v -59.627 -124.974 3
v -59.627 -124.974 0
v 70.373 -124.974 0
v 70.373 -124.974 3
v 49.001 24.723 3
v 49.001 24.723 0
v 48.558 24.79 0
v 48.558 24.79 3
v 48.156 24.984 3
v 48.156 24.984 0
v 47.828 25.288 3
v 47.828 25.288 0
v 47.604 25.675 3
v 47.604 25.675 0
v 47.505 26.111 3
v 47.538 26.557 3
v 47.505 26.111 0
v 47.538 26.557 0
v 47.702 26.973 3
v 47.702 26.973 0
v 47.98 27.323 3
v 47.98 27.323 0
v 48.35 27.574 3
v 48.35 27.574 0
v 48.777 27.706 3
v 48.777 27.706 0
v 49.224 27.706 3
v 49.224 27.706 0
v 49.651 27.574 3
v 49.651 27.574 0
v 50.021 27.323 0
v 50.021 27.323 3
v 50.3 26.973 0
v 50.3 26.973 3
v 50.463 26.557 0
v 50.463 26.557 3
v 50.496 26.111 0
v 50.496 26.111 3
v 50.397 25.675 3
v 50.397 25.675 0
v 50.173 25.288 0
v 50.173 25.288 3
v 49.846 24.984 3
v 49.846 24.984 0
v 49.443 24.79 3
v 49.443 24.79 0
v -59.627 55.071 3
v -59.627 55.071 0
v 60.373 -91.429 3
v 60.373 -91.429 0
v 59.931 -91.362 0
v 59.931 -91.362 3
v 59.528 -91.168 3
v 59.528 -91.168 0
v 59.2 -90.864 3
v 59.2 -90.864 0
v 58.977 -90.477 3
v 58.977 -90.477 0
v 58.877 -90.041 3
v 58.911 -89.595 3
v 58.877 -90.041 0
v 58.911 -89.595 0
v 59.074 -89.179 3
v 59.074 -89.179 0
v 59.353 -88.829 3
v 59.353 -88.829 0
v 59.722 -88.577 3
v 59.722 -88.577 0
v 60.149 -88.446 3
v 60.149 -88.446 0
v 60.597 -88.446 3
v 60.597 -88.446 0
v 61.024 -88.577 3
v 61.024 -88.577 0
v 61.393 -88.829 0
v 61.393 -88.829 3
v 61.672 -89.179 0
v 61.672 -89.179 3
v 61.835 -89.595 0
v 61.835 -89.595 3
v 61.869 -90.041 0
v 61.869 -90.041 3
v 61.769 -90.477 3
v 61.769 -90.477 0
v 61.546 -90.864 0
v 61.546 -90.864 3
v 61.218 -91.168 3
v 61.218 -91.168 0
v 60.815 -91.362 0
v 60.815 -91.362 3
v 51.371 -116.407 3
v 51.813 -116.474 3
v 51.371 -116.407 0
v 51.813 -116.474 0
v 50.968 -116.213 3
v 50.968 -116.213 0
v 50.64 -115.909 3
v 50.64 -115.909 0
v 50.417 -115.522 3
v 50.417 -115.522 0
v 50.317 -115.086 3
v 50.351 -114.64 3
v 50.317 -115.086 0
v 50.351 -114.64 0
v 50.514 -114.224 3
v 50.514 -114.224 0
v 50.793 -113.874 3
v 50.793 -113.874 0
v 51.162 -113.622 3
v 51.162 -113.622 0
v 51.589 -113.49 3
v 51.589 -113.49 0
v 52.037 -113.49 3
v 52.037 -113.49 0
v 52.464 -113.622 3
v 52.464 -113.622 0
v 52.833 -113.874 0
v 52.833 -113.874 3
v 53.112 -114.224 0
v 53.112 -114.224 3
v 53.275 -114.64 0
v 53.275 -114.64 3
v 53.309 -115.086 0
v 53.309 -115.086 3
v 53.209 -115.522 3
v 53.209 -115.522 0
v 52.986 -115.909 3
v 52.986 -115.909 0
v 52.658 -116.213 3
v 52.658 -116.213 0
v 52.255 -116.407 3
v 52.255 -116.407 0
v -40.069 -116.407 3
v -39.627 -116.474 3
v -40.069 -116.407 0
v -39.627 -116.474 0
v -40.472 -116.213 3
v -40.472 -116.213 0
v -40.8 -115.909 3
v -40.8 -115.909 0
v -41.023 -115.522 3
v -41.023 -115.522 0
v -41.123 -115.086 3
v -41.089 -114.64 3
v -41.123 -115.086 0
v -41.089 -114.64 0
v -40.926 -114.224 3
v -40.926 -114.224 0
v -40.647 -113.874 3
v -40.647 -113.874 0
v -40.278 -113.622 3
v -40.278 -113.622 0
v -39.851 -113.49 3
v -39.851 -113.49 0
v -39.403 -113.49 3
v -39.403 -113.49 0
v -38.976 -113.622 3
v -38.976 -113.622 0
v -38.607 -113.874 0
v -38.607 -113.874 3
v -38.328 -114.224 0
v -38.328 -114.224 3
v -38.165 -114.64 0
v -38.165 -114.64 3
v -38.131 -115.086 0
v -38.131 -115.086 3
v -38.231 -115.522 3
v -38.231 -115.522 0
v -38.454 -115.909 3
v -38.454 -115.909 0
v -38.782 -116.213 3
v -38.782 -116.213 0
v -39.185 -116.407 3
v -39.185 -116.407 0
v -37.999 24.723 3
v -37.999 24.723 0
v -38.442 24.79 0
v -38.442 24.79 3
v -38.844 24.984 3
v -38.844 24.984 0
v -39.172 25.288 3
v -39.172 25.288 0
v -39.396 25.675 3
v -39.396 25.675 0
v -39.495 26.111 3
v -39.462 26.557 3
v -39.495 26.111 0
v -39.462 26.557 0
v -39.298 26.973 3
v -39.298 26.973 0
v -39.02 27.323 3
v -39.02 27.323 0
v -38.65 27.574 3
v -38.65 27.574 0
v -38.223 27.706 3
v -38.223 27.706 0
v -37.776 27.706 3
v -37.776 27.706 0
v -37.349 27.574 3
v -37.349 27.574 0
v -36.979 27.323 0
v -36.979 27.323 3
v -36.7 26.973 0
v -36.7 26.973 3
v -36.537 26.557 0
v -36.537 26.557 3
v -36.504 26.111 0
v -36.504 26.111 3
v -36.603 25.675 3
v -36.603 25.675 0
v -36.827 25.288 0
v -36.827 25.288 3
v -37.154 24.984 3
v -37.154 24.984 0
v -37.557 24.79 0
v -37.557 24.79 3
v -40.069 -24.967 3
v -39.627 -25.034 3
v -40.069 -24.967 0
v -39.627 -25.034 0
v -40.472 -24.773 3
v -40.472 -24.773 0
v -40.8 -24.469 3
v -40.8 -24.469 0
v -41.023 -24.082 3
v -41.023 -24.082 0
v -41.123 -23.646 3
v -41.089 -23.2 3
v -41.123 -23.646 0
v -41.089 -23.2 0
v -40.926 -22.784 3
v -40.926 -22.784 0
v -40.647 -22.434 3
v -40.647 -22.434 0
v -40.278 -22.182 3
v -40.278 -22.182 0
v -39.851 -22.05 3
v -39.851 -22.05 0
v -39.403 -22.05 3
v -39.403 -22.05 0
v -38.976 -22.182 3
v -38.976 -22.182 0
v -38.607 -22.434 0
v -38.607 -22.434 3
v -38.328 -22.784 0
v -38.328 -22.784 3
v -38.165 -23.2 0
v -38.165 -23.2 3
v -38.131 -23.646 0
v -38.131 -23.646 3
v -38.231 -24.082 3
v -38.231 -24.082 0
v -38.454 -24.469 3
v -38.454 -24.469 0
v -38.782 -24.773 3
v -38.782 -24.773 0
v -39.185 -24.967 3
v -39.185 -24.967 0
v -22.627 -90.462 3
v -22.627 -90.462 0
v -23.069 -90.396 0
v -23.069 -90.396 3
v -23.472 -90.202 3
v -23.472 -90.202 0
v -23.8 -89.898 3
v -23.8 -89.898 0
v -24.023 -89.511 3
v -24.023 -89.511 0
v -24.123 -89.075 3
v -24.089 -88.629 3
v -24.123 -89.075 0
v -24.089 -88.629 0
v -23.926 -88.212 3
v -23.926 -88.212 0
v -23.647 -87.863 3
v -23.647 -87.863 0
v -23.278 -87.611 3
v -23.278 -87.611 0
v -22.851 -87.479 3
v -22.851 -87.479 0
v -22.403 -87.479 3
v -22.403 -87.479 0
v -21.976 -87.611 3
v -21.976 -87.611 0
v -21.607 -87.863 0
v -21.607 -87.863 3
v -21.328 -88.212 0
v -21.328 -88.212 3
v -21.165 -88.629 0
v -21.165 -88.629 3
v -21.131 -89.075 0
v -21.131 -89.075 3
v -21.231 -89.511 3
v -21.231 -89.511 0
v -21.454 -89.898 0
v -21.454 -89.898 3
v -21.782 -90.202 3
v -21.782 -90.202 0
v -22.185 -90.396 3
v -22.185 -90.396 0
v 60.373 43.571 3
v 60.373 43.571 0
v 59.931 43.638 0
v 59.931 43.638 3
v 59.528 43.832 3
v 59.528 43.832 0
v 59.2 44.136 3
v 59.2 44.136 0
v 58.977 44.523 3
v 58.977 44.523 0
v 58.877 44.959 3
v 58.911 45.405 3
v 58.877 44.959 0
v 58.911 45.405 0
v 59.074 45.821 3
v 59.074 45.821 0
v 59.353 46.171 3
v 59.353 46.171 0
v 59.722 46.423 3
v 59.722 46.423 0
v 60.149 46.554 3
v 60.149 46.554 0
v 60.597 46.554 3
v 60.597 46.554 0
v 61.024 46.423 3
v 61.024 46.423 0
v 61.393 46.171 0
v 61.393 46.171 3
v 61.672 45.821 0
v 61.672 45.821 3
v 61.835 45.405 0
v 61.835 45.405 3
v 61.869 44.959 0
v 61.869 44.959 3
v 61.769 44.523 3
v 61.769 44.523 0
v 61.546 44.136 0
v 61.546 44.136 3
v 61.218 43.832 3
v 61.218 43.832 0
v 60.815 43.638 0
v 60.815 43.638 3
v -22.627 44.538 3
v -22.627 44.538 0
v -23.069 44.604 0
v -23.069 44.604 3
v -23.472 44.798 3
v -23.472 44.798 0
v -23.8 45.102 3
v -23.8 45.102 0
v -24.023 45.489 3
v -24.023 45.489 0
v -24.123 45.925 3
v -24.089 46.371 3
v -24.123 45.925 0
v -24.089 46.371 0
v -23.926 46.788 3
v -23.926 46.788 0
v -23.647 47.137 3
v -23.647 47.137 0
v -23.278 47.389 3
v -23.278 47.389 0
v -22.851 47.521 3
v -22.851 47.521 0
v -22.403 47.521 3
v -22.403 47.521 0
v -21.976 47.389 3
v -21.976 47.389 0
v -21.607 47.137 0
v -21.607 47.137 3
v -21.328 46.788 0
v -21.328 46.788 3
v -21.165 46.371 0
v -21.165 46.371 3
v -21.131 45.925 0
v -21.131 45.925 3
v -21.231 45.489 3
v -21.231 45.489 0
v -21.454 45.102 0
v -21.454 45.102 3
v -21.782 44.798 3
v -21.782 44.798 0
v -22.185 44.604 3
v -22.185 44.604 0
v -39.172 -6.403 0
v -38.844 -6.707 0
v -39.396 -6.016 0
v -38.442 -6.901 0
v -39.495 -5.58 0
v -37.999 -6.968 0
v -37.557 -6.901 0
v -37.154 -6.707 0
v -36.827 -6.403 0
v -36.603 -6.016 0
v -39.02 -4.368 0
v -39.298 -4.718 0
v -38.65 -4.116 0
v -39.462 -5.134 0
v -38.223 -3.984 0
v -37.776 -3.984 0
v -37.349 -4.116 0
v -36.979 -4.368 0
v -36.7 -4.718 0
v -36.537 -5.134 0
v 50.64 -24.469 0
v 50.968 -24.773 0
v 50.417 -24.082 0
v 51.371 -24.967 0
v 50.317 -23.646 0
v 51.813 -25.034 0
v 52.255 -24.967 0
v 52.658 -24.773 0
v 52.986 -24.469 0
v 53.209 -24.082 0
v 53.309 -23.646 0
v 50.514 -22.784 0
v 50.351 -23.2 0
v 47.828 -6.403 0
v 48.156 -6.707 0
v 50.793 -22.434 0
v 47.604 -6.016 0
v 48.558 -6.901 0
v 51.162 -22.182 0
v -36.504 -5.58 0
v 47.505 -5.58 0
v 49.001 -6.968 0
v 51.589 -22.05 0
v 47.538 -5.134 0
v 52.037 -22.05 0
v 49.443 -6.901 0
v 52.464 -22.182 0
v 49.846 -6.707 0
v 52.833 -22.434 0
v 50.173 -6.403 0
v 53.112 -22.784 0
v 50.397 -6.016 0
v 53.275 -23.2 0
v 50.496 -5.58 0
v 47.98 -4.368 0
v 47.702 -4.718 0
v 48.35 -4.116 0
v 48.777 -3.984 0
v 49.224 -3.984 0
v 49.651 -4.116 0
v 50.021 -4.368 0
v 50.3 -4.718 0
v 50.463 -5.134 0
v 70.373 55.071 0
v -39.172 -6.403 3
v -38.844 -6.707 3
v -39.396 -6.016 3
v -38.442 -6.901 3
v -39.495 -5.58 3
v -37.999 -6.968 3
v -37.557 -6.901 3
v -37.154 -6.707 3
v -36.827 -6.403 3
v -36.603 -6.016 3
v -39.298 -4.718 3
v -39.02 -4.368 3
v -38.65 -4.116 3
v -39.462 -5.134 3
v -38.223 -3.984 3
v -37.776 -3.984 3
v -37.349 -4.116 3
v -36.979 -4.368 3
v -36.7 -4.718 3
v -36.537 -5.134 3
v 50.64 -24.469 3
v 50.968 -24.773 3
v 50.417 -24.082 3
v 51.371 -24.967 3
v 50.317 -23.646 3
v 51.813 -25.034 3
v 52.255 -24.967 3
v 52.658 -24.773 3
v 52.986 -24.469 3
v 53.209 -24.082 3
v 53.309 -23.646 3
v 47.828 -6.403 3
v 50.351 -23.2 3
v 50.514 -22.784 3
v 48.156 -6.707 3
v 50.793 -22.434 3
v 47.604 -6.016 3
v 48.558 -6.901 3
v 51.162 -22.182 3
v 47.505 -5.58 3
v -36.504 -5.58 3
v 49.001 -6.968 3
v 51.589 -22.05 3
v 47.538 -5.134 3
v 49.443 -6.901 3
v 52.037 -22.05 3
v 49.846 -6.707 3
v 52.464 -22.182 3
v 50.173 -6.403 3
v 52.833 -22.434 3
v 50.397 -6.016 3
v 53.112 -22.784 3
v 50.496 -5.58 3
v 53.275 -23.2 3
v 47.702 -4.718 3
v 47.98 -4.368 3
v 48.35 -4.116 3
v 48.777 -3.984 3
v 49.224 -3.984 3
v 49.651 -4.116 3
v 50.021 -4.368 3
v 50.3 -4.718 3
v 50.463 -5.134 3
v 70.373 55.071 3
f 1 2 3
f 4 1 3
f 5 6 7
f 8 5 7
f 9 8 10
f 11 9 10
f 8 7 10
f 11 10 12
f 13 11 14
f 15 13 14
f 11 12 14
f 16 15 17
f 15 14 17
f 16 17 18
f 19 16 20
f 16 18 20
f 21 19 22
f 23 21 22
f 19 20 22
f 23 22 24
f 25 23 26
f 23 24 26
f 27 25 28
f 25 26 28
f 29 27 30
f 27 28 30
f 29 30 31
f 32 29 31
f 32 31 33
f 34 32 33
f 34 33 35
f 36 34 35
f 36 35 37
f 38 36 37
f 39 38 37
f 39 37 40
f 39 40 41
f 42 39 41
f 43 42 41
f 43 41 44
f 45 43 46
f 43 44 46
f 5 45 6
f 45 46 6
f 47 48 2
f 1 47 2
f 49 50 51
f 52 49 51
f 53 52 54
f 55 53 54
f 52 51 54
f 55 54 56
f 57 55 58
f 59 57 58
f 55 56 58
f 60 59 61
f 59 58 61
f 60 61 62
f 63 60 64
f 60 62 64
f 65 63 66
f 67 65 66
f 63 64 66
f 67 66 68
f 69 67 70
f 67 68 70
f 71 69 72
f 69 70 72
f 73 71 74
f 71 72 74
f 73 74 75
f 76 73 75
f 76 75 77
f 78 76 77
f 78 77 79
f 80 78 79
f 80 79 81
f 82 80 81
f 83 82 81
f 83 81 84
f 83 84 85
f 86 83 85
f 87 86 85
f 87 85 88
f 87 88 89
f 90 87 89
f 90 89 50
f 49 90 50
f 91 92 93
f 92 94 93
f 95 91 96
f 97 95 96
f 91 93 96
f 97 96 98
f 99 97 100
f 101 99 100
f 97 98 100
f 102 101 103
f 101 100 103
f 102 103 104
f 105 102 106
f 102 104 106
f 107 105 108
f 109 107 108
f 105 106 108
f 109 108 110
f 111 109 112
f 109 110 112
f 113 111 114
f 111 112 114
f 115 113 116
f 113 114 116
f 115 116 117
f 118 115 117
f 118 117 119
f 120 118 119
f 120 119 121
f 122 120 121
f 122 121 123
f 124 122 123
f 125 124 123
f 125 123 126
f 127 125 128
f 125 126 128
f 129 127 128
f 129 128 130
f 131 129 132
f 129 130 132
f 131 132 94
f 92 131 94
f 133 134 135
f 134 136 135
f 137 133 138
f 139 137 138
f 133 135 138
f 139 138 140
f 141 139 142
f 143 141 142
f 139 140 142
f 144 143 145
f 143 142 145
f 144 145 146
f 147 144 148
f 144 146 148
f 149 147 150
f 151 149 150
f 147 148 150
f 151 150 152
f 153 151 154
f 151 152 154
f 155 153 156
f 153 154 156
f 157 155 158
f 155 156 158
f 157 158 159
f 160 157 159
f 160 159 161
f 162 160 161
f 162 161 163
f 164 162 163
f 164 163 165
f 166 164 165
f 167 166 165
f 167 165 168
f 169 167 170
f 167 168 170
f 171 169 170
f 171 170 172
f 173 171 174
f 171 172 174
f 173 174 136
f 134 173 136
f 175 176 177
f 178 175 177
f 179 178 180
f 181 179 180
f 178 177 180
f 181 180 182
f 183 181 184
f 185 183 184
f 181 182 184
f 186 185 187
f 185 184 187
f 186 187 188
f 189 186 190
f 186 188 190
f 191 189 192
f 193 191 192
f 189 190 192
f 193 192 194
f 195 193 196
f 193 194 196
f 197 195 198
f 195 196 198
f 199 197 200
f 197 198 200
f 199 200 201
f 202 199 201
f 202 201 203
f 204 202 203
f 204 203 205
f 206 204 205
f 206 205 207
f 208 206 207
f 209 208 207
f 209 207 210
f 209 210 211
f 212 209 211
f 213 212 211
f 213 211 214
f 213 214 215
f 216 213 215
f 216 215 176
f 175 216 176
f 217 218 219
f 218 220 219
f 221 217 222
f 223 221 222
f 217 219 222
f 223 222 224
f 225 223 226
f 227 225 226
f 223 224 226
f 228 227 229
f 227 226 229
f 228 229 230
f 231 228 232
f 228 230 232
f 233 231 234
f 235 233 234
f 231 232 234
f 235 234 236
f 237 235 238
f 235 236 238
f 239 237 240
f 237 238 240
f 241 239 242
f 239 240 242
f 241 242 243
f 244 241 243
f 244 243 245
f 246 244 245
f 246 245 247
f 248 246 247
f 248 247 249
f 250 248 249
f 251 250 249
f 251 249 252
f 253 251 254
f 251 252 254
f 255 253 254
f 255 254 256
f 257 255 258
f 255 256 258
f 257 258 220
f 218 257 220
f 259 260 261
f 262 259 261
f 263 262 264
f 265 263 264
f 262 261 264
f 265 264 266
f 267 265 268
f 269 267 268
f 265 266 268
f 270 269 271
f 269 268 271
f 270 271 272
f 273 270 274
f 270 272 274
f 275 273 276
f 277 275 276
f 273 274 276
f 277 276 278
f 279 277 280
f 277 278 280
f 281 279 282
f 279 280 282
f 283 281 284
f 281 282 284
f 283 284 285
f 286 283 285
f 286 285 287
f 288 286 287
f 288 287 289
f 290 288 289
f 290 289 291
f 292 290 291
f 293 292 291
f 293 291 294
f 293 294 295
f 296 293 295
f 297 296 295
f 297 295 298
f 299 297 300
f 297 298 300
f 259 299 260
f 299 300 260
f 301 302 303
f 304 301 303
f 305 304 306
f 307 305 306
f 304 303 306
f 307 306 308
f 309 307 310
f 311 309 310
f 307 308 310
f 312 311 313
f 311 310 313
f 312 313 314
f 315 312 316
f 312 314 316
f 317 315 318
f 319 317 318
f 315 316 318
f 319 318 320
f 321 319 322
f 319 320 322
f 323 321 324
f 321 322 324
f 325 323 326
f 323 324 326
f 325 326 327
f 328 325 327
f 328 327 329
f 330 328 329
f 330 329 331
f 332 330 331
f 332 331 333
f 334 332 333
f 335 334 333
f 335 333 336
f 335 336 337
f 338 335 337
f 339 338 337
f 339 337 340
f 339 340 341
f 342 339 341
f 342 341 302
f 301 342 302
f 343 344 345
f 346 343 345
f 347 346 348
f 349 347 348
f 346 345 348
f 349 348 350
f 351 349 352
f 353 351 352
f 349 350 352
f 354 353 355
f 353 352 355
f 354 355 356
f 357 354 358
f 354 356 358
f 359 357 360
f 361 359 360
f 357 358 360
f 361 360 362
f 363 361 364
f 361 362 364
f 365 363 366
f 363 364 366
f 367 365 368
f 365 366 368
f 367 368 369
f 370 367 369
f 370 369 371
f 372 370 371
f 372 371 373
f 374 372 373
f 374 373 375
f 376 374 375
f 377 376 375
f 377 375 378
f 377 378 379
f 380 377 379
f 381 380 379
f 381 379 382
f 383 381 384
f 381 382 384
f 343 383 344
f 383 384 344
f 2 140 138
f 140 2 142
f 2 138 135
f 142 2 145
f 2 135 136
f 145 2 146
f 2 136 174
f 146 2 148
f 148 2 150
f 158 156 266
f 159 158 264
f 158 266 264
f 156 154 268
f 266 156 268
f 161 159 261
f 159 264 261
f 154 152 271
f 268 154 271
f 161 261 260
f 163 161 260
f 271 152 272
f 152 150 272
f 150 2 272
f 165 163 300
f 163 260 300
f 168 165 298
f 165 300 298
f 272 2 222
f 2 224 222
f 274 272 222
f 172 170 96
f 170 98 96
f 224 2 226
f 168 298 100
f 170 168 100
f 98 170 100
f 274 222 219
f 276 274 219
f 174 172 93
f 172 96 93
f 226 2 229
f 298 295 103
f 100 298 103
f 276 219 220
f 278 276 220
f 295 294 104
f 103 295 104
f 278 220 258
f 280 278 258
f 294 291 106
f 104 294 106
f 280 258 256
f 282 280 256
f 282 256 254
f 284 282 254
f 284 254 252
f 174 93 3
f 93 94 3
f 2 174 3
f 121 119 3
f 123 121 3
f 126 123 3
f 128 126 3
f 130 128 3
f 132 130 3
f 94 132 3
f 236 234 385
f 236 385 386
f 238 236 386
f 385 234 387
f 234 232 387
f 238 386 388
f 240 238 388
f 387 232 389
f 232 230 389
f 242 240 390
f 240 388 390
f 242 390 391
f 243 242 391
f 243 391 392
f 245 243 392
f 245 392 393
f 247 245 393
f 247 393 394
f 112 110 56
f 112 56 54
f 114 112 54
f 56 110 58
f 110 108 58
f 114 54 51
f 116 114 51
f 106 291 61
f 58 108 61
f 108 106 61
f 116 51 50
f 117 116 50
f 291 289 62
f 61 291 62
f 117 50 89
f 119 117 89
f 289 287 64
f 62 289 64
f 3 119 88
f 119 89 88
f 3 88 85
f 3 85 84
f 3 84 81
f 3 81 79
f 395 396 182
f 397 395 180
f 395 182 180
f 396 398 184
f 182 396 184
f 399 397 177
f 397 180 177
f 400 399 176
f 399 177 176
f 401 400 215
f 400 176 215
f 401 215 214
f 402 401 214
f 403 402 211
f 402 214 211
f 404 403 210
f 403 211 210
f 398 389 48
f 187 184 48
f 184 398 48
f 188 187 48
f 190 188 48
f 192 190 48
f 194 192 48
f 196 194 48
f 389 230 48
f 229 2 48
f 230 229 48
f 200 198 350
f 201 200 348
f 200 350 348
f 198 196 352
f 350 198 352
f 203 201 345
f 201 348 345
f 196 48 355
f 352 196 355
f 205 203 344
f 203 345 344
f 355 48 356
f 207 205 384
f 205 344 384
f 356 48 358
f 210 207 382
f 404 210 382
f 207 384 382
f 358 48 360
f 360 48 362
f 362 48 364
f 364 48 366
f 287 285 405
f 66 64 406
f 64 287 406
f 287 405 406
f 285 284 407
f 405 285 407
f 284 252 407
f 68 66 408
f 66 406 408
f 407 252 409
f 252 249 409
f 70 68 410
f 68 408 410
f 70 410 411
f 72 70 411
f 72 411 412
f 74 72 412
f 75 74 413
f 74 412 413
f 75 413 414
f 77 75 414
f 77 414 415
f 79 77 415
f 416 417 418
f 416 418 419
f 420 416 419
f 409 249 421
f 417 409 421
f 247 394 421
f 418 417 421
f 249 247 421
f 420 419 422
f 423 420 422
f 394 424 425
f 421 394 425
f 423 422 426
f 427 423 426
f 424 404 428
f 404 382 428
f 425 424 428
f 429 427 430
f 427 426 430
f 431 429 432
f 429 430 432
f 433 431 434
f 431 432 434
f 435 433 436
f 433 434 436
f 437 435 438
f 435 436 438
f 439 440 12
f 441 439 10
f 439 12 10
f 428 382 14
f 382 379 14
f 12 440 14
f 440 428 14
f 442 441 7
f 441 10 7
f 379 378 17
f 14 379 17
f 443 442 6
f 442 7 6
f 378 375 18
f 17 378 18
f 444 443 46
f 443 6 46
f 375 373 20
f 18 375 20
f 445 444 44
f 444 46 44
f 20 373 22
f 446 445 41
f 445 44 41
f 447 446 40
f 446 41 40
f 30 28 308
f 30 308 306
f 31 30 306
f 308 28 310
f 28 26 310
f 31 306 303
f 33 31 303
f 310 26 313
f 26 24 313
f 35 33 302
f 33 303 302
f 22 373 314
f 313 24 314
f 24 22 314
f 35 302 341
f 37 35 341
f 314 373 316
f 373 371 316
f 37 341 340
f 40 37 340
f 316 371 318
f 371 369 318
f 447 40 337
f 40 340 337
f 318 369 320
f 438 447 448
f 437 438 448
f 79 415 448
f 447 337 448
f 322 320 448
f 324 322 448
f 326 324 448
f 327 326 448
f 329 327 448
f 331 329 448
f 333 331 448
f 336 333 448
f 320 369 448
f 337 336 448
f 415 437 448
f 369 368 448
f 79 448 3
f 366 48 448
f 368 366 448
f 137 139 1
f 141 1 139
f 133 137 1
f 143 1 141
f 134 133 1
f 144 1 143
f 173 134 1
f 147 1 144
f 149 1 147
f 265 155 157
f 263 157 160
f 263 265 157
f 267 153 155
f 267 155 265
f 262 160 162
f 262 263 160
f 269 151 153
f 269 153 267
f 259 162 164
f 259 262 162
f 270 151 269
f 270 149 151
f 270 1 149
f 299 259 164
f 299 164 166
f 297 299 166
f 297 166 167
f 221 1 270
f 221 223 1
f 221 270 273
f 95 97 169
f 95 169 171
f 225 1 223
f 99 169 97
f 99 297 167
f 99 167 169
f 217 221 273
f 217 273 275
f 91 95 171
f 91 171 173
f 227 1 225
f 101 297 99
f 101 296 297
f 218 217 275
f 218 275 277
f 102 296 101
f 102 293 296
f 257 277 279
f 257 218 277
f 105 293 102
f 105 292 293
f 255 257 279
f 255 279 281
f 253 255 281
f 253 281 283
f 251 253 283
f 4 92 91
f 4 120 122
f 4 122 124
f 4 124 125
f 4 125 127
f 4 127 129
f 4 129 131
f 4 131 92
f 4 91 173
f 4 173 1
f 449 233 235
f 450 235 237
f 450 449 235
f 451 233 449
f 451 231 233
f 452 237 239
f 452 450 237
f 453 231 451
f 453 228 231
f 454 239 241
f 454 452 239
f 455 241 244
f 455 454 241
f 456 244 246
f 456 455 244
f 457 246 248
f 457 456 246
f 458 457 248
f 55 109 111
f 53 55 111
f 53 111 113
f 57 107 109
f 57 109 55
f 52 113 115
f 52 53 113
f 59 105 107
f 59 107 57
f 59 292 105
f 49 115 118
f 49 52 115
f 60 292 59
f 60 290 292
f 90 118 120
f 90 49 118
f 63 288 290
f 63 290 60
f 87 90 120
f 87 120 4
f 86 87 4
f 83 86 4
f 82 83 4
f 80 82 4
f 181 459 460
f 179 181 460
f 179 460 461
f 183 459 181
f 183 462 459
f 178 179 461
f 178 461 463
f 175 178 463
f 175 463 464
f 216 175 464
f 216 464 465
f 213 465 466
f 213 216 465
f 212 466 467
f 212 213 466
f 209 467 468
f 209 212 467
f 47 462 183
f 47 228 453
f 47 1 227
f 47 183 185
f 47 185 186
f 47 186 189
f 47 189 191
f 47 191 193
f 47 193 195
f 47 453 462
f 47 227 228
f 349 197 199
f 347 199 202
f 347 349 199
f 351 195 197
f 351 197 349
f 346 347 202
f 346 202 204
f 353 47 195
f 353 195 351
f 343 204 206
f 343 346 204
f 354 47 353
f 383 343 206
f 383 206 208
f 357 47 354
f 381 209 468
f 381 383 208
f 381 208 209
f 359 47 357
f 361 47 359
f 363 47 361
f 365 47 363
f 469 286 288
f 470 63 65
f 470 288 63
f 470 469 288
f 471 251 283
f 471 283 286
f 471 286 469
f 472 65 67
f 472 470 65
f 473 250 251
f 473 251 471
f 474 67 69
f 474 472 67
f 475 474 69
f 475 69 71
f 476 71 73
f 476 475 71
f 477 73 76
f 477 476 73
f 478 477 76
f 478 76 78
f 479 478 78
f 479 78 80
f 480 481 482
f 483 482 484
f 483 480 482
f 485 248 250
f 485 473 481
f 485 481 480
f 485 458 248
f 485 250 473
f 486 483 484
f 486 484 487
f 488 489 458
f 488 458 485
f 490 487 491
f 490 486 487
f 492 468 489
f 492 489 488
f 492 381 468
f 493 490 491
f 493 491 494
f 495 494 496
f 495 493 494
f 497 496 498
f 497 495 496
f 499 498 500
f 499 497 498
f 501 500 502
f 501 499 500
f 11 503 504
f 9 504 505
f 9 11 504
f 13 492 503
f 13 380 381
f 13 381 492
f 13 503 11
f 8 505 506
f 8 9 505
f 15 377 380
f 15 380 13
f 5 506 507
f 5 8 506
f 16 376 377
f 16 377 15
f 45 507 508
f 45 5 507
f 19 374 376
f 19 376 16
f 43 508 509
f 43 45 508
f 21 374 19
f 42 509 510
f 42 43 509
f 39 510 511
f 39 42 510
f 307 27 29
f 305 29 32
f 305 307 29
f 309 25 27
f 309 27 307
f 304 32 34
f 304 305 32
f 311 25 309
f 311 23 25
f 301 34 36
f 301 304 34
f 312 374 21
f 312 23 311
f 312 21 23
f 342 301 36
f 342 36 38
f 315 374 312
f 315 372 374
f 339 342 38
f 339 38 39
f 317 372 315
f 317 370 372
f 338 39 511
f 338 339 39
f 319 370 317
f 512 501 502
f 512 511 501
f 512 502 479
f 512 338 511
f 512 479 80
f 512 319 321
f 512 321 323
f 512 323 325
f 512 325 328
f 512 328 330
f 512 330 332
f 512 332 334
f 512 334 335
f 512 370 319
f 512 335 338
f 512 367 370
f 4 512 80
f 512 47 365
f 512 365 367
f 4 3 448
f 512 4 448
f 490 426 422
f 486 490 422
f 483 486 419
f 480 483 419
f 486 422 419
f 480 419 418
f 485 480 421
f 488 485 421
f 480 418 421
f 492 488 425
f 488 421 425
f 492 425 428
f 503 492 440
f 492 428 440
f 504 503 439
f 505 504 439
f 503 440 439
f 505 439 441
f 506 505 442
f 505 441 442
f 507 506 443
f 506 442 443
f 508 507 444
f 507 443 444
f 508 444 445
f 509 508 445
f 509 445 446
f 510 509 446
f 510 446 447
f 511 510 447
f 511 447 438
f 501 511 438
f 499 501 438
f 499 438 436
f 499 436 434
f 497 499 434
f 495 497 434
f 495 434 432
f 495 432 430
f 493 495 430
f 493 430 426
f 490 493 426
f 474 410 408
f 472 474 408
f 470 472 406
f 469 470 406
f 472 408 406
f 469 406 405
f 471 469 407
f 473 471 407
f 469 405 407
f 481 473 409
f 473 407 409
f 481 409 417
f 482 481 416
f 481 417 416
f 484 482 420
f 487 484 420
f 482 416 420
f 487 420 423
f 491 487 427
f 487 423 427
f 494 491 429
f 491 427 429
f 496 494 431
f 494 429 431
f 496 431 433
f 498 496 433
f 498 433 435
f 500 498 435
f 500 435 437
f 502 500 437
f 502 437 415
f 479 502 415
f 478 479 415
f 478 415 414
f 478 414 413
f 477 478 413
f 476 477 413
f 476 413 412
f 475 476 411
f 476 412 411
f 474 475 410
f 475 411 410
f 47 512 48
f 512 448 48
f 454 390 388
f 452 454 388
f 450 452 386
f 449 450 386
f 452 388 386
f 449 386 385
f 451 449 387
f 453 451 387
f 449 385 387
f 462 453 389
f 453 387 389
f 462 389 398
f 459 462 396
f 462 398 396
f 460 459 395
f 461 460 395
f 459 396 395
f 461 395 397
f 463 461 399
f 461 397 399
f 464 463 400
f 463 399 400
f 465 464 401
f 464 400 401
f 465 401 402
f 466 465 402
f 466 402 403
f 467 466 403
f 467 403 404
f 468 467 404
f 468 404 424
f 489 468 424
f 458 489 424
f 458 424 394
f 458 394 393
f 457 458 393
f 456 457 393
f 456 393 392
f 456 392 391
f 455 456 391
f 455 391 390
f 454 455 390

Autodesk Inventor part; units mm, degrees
ref_plane "YZ Plane" through (0, 0, 0) normal (1, 0, 0) x (0, 1, 0)
ref_plane "XZ Plane" through (0, 0, 0) normal (0, 1, 0) x (-1, 0, 0)
ref_plane "XY Plane" through (0, 0, 0) normal (0, 0, 1) x (1, 0, 0)
sketch "Sketch1" plane through (0, 0, 0) normal (0, 0, 1) x (1, 0, 0)
  line L0 (-43.437, -19.7437) -> (55.293, -19.7437)
  line L1 (55.293, -19.7437) -> (55.293, -118.7837)
  circle A0 centre (6.169, -65.1647) radius 0.508
  circle A1 centre (-0.333, -65.1647) radius 0.508
  arc A2 (23.1745, -85.9924) -> (23.1745, -82.9951) centre (23.238, -84.4937) ccw
  arc A3 (23.1745, -82.9951) -> (23.1745, -85.9924) centre (23.111, -84.4937) ccw
  circle A4 centre (-11.179, -100.7497) radius 0.75
  circle A5 centre (28.445, -83.4777) radius 0.75
  circle A6 centre (36.573, -92.1137) radius 0.508
  circle A7 centre (-30.737, -64.3737) radius 0.4
  circle A8 centre (-25.657, -64.3737) radius 0.4
  circle A9 centre (-33.277, -89.3737) radius 0.4
  circle A10 centre (-28.197, -89.3737) radius 0.4
  circle A11 centre (-23.117, -89.3737) radius 0.4
  circle A12 centre (-12.957, -41.3137) radius 0.508
  circle A13 centre (-7.877, -41.3137) radius 0.508
  circle A14 centre (-12.957, -32.4237) radius 0.508
  circle A15 centre (-7.877, -32.4237) radius 0.508
  circle A16 centre (-25.657, -98.4637) radius 0.508
  circle A17 centre (-30.737, -98.4637) radius 0.508
  circle A18 centre (-29.467, -32.4237) radius 0.508
  circle A19 centre (-24.387, -32.4237) radius 0.508
  circle A20 centre (-14.227, -60.3637) radius 0.55
  circle A21 centre (-32.007, -71.7937) radius 0.508
  circle A22 centre (-26.927, -71.7937) radius 0.508
  circle A23 centre (-21.847, -71.7937) radius 0.508
  circle A24 centre (-14.227, -71.7937) radius 0.508
  circle A25 centre (-9.147, -71.7937) radius 0.508
  circle A26 centre (-4.067, -71.7937) radius 0.508
  circle A27 centre (-32.007, -23.5337) radius 0.508
  circle A28 centre (-26.927, -23.5337) radius 0.508
  circle A29 centre (-21.847, -23.5337) radius 0.508
  circle A30 centre (-16.767, -23.5337) radius 0.508
  circle A31 centre (-10.163, -23.5337) radius 0.508
  circle A32 centre (-5.083, -23.5337) radius 0.508
  circle A33 centre (-0.003, -23.5337) radius 0.508
  circle A34 centre (5.077, -23.5337) radius 0.508
  circle A35 centre (-39.627, -23.5337) radius 1.5
  circle A36 centre (51.813, -114.9737) radius 1.5
  circle A37 centre (-37.087, -38.7737) radius 1.6
  circle A38 centre (-7.877, -51.4737) radius 0.55
  circle A39 centre (-9.147, -60.3637) radius 0.55
  circle A40 centre (-7.877, -46.3937) radius 0.55
  circle A41 centre (13.713, -23.5337) radius 1.6
  circle A42 centre (-37.087, -66.7137) radius 1.6
  circle A43 centre (-39.627, -114.9737) radius 1.5
  circle A44 centre (51.813, -23.5337) radius 1.5
  circle A45 centre (2.537, -23.5337) radius 0.508
  circle A46 centre (-2.543, -23.5337) radius 0.508
  circle A47 centre (-7.623, -23.5337) radius 0.508
  circle A48 centre (-12.703, -23.5337) radius 0.508
  circle A49 centre (-19.307, -23.5337) radius 0.508
  circle A50 centre (-24.387, -23.5337) radius 0.508
  circle A51 centre (-29.467, -23.5337) radius 0.508
  circle A52 centre (-34.547, -23.5337) radius 0.508
  circle A53 centre (-6.607, -71.7937) radius 0.508
  circle A54 centre (-11.687, -71.7937) radius 0.508
  circle A55 centre (-16.767, -71.7937) radius 0.508
  circle A56 centre (-24.387, -71.7937) radius 0.508
  circle A57 centre (-29.467, -71.7937) radius 0.508
  circle A58 centre (-34.547, -71.7937) radius 0.508
  circle A59 centre (-21.847, -32.4237) radius 0.508
  circle A60 centre (-26.927, -32.4237) radius 0.508
  circle A61 centre (-33.277, -98.4637) radius 0.508
  circle A62 centre (-28.197, -98.4637) radius 0.508
  circle A63 centre (-5.337, -32.4237) radius 0.508
  circle A64 centre (-10.417, -32.4237) radius 0.508
  circle A65 centre (-5.337, -41.3137) radius 0.508
  circle A66 centre (-10.417, -41.3137) radius 0.508
  circle A67 centre (-20.577, -89.3737) radius 0.4
  circle A68 centre (-25.657, -89.3737) radius 0.4
  circle A69 centre (-30.737, -89.3737) radius 0.4
  circle A70 centre (-23.117, -64.3737) radius 0.4
  circle A71 centre (-28.197, -64.3737) radius 0.4
  circle A72 centre (36.573, -89.5737) radius 0.508
  circle A73 centre (36.573, -94.6537) radius 0.508
  circle A74 centre (28.445, -100.7497) radius 0.75
  circle A75 centre (-11.179, -83.4777) radius 0.75
  circle A76 centre (-6.607, -99.7337) radius 1.5
  circle A77 centre (-0.333, -60.6427) radius 0.508
  circle A78 centre (6.169, -60.6427) radius 0.508
  line L2 (55.293, -118.7837) -> (-43.437, -118.7837)
  line L3 (55.293, -19.7437) -> (55.293, -118.7837)
  line L4 (-43.437, -19.7437) -> (55.293, -19.7437)
  line L5 (-43.437, -118.7837) -> (-43.437, -19.7437)
  line L6 (-59.627, 55.0712) -> (-59.627, -124.9737)
  line L7 (-59.627, -124.9737) -> (70.373, -124.9737)
  line L8 (70.373, -124.9737) -> (70.373, 55.0712)
  line L9 (70.373, 55.0712) -> (-59.627, 55.0712)
  arc A79 (-37.9994, -7.7176) -> (-37.9994, -3.2176) centre (-37.9994, -5.4676) ccw
  arc A80 (-37.9994, 23.973) -> (-37.9994, 28.473) centre (-37.9994, 26.223) ccw
  arc A81 (49.0006, -3.2176) -> (49.0006, -7.7176) centre (49.0006, -5.4676) ccw
  arc A82 (49.0006, 28.473) -> (49.0006, 23.973) centre (49.0006, 26.223) ccw
  circle A83 centre (-39.627, -23.5337) radius 1.5
  circle A84 centre (-39.627, -114.9737) radius 1.5
  circle A85 centre (51.813, -114.9737) radius 1.5
  circle A86 centre (51.813, -23.5337) radius 1.5
  circle A87 centre (49.0006, -5.4676) radius 1.5
  circle A88 centre (49.0006, 26.223) radius 1.5
  circle A89 centre (-37.9994, 26.223) radius 1.1903
  circle A90 centre (-37.9994, -5.4676) radius 1.5
  point P0 (0, 0)
  point P1 (-30.337, -14.7437)
  point P2 (19.4617, -123.7837)
  point P3 (60.293, -53.7773)
  point P4 (-48.437, -58.5398)
extrude "Extrusion1" add sketch "Sketch1" along normal blind 3 contours L0 L1 L2 L5 | A0 | A1 | A3 A2 | A4 | A5 | A6 | A7 | A8 | A9 | A10 | A11 | A12 | A13 | A14 | A15 | A16 | A17 | A18 | A19 | A20 | A21 | A22 | A23 | A24 | A25 | A26 | A27 | A28 | A29 | A30 | A31 | A32 | A33 | A34 | A35 | A36 | A37 | A38 | A39 | A40 | A41 | A42 | A43 | A44 | A45 | A46 | A47 | A48 | A49 | A50 | A51 | A52 | A53 | A54 | A55 | A56 | A57 | A58 | A59 | A60 | A61 | A62 | A63 | A64 | A65 | A66 | A67 | A68 | A69 | A70 | A71 | A72 | A73 | A74 | A75 | A76 | A77 | A78 | L9 L8 L7 L6 | A87 | A88 | A89 | A90
sketch "Sketch6" plane through (0, 0, 0) normal (0, 0, -1) x (-1, 0, 0)
  arc A0 (37.9994, 28.473) -> (37.9994, 23.973) centre (37.9994, 26.223) ccw projected
  arc A1 (37.9994, -3.2176) -> (37.9994, -7.7176) centre (37.9994, -5.4676) ccw projected
  arc A2 (-49.0006, 23.973) -> (-49.0006, 28.473) centre (-49.0006, 26.223) ccw projected
  arc A3 (-49.0006, -7.7176) -> (-49.0006, -3.2176) centre (-49.0006, -5.4676) ccw projected
  arc A4 (-49.0006, 23.973) -> (-49.0006, 28.473) centre (-49.0006, 26.223) ccw projected
  arc A5 (-49.0006, 23.973) -> (-49.0006, 28.473) centre (-49.0006, 26.223) ccw projected
  arc A6 (-49.0006, 23.973) -> (-49.0006, 28.473) centre (-49.0006, 26.223) ccw projected
  point P0 (0, 0)
sketch "Sketch7" plane through (0, 0, 3) normal (0, 0, 1) x (1, 0, 0)
  arc A0 (49.0006, 28.473) -> (49.0006, 23.973) centre (49.0006, 26.223) ccw projected
  arc A1 (49.0006, -3.2176) -> (49.0006, -7.7176) centre (49.0006, -5.4676) ccw projected
  arc A2 (-37.9994, -7.7176) -> (-37.9994, -3.2176) centre (-37.9994, -5.4676) ccw projected
  arc A3 (-37.9994, 23.973) -> (-37.9994, 28.473) centre (-37.9994, 26.223) ccw projected
  circle A4 centre (-39.627, -114.9737) radius 1.5 projected
  circle A5 centre (-39.627, -23.5337) radius 1.5 projected
  circle A6 centre (51.813, -23.5337) radius 1.5 projected
  circle A7 centre (51.813, -114.9737) radius 1.5 projected
  point P0 (0, 0)
hole "Hole5" at (49.0006, 26.223, 3) at (49.0006, -5.4676, 3) at (-37.9994, 26.223, 3) at (-37.9994, -5.4676, 3) at (-39.627, -23.5337, 3) at (51.813, -23.5337, 3) at (51.813, -114.9737, 3) at (-39.627, -114.9737, 3) direction (0, 0, -1) diameter 3 end through all
sketch "Sketch8" plane through (0, 0, 3) normal (0, 0, 1) x (1, 0, 0)
  line L0 (70.373, 55.0712) -> (-59.627, 55.0712) projected
  line L1 (70.373, -124.9737) -> (70.373, 55.0712) projected
  point P0 (0, 0)
  point P1 (60.373, 45.0712)
  point P2 (-22.627, 46.0375)
  point P3 (60.373, -89.9288)
  point P4 (-22.627, -88.9625)
  dimension "d61" = 10
  dimension "d62" = 10
  dimension "d63" = 83
  dimension "d64" = 135
  dimension "d65" = 135
  dimension "d73" = 83
hole "Hole6" at (60.373, 45.0712, 3) at (60.373, -89.9288, 3) at (-22.627, -88.9625, 3) at (-22.627, 46.0375, 3) direction (0, 0, -1) diameter 3 end through all
properties part number "Akrilik"
